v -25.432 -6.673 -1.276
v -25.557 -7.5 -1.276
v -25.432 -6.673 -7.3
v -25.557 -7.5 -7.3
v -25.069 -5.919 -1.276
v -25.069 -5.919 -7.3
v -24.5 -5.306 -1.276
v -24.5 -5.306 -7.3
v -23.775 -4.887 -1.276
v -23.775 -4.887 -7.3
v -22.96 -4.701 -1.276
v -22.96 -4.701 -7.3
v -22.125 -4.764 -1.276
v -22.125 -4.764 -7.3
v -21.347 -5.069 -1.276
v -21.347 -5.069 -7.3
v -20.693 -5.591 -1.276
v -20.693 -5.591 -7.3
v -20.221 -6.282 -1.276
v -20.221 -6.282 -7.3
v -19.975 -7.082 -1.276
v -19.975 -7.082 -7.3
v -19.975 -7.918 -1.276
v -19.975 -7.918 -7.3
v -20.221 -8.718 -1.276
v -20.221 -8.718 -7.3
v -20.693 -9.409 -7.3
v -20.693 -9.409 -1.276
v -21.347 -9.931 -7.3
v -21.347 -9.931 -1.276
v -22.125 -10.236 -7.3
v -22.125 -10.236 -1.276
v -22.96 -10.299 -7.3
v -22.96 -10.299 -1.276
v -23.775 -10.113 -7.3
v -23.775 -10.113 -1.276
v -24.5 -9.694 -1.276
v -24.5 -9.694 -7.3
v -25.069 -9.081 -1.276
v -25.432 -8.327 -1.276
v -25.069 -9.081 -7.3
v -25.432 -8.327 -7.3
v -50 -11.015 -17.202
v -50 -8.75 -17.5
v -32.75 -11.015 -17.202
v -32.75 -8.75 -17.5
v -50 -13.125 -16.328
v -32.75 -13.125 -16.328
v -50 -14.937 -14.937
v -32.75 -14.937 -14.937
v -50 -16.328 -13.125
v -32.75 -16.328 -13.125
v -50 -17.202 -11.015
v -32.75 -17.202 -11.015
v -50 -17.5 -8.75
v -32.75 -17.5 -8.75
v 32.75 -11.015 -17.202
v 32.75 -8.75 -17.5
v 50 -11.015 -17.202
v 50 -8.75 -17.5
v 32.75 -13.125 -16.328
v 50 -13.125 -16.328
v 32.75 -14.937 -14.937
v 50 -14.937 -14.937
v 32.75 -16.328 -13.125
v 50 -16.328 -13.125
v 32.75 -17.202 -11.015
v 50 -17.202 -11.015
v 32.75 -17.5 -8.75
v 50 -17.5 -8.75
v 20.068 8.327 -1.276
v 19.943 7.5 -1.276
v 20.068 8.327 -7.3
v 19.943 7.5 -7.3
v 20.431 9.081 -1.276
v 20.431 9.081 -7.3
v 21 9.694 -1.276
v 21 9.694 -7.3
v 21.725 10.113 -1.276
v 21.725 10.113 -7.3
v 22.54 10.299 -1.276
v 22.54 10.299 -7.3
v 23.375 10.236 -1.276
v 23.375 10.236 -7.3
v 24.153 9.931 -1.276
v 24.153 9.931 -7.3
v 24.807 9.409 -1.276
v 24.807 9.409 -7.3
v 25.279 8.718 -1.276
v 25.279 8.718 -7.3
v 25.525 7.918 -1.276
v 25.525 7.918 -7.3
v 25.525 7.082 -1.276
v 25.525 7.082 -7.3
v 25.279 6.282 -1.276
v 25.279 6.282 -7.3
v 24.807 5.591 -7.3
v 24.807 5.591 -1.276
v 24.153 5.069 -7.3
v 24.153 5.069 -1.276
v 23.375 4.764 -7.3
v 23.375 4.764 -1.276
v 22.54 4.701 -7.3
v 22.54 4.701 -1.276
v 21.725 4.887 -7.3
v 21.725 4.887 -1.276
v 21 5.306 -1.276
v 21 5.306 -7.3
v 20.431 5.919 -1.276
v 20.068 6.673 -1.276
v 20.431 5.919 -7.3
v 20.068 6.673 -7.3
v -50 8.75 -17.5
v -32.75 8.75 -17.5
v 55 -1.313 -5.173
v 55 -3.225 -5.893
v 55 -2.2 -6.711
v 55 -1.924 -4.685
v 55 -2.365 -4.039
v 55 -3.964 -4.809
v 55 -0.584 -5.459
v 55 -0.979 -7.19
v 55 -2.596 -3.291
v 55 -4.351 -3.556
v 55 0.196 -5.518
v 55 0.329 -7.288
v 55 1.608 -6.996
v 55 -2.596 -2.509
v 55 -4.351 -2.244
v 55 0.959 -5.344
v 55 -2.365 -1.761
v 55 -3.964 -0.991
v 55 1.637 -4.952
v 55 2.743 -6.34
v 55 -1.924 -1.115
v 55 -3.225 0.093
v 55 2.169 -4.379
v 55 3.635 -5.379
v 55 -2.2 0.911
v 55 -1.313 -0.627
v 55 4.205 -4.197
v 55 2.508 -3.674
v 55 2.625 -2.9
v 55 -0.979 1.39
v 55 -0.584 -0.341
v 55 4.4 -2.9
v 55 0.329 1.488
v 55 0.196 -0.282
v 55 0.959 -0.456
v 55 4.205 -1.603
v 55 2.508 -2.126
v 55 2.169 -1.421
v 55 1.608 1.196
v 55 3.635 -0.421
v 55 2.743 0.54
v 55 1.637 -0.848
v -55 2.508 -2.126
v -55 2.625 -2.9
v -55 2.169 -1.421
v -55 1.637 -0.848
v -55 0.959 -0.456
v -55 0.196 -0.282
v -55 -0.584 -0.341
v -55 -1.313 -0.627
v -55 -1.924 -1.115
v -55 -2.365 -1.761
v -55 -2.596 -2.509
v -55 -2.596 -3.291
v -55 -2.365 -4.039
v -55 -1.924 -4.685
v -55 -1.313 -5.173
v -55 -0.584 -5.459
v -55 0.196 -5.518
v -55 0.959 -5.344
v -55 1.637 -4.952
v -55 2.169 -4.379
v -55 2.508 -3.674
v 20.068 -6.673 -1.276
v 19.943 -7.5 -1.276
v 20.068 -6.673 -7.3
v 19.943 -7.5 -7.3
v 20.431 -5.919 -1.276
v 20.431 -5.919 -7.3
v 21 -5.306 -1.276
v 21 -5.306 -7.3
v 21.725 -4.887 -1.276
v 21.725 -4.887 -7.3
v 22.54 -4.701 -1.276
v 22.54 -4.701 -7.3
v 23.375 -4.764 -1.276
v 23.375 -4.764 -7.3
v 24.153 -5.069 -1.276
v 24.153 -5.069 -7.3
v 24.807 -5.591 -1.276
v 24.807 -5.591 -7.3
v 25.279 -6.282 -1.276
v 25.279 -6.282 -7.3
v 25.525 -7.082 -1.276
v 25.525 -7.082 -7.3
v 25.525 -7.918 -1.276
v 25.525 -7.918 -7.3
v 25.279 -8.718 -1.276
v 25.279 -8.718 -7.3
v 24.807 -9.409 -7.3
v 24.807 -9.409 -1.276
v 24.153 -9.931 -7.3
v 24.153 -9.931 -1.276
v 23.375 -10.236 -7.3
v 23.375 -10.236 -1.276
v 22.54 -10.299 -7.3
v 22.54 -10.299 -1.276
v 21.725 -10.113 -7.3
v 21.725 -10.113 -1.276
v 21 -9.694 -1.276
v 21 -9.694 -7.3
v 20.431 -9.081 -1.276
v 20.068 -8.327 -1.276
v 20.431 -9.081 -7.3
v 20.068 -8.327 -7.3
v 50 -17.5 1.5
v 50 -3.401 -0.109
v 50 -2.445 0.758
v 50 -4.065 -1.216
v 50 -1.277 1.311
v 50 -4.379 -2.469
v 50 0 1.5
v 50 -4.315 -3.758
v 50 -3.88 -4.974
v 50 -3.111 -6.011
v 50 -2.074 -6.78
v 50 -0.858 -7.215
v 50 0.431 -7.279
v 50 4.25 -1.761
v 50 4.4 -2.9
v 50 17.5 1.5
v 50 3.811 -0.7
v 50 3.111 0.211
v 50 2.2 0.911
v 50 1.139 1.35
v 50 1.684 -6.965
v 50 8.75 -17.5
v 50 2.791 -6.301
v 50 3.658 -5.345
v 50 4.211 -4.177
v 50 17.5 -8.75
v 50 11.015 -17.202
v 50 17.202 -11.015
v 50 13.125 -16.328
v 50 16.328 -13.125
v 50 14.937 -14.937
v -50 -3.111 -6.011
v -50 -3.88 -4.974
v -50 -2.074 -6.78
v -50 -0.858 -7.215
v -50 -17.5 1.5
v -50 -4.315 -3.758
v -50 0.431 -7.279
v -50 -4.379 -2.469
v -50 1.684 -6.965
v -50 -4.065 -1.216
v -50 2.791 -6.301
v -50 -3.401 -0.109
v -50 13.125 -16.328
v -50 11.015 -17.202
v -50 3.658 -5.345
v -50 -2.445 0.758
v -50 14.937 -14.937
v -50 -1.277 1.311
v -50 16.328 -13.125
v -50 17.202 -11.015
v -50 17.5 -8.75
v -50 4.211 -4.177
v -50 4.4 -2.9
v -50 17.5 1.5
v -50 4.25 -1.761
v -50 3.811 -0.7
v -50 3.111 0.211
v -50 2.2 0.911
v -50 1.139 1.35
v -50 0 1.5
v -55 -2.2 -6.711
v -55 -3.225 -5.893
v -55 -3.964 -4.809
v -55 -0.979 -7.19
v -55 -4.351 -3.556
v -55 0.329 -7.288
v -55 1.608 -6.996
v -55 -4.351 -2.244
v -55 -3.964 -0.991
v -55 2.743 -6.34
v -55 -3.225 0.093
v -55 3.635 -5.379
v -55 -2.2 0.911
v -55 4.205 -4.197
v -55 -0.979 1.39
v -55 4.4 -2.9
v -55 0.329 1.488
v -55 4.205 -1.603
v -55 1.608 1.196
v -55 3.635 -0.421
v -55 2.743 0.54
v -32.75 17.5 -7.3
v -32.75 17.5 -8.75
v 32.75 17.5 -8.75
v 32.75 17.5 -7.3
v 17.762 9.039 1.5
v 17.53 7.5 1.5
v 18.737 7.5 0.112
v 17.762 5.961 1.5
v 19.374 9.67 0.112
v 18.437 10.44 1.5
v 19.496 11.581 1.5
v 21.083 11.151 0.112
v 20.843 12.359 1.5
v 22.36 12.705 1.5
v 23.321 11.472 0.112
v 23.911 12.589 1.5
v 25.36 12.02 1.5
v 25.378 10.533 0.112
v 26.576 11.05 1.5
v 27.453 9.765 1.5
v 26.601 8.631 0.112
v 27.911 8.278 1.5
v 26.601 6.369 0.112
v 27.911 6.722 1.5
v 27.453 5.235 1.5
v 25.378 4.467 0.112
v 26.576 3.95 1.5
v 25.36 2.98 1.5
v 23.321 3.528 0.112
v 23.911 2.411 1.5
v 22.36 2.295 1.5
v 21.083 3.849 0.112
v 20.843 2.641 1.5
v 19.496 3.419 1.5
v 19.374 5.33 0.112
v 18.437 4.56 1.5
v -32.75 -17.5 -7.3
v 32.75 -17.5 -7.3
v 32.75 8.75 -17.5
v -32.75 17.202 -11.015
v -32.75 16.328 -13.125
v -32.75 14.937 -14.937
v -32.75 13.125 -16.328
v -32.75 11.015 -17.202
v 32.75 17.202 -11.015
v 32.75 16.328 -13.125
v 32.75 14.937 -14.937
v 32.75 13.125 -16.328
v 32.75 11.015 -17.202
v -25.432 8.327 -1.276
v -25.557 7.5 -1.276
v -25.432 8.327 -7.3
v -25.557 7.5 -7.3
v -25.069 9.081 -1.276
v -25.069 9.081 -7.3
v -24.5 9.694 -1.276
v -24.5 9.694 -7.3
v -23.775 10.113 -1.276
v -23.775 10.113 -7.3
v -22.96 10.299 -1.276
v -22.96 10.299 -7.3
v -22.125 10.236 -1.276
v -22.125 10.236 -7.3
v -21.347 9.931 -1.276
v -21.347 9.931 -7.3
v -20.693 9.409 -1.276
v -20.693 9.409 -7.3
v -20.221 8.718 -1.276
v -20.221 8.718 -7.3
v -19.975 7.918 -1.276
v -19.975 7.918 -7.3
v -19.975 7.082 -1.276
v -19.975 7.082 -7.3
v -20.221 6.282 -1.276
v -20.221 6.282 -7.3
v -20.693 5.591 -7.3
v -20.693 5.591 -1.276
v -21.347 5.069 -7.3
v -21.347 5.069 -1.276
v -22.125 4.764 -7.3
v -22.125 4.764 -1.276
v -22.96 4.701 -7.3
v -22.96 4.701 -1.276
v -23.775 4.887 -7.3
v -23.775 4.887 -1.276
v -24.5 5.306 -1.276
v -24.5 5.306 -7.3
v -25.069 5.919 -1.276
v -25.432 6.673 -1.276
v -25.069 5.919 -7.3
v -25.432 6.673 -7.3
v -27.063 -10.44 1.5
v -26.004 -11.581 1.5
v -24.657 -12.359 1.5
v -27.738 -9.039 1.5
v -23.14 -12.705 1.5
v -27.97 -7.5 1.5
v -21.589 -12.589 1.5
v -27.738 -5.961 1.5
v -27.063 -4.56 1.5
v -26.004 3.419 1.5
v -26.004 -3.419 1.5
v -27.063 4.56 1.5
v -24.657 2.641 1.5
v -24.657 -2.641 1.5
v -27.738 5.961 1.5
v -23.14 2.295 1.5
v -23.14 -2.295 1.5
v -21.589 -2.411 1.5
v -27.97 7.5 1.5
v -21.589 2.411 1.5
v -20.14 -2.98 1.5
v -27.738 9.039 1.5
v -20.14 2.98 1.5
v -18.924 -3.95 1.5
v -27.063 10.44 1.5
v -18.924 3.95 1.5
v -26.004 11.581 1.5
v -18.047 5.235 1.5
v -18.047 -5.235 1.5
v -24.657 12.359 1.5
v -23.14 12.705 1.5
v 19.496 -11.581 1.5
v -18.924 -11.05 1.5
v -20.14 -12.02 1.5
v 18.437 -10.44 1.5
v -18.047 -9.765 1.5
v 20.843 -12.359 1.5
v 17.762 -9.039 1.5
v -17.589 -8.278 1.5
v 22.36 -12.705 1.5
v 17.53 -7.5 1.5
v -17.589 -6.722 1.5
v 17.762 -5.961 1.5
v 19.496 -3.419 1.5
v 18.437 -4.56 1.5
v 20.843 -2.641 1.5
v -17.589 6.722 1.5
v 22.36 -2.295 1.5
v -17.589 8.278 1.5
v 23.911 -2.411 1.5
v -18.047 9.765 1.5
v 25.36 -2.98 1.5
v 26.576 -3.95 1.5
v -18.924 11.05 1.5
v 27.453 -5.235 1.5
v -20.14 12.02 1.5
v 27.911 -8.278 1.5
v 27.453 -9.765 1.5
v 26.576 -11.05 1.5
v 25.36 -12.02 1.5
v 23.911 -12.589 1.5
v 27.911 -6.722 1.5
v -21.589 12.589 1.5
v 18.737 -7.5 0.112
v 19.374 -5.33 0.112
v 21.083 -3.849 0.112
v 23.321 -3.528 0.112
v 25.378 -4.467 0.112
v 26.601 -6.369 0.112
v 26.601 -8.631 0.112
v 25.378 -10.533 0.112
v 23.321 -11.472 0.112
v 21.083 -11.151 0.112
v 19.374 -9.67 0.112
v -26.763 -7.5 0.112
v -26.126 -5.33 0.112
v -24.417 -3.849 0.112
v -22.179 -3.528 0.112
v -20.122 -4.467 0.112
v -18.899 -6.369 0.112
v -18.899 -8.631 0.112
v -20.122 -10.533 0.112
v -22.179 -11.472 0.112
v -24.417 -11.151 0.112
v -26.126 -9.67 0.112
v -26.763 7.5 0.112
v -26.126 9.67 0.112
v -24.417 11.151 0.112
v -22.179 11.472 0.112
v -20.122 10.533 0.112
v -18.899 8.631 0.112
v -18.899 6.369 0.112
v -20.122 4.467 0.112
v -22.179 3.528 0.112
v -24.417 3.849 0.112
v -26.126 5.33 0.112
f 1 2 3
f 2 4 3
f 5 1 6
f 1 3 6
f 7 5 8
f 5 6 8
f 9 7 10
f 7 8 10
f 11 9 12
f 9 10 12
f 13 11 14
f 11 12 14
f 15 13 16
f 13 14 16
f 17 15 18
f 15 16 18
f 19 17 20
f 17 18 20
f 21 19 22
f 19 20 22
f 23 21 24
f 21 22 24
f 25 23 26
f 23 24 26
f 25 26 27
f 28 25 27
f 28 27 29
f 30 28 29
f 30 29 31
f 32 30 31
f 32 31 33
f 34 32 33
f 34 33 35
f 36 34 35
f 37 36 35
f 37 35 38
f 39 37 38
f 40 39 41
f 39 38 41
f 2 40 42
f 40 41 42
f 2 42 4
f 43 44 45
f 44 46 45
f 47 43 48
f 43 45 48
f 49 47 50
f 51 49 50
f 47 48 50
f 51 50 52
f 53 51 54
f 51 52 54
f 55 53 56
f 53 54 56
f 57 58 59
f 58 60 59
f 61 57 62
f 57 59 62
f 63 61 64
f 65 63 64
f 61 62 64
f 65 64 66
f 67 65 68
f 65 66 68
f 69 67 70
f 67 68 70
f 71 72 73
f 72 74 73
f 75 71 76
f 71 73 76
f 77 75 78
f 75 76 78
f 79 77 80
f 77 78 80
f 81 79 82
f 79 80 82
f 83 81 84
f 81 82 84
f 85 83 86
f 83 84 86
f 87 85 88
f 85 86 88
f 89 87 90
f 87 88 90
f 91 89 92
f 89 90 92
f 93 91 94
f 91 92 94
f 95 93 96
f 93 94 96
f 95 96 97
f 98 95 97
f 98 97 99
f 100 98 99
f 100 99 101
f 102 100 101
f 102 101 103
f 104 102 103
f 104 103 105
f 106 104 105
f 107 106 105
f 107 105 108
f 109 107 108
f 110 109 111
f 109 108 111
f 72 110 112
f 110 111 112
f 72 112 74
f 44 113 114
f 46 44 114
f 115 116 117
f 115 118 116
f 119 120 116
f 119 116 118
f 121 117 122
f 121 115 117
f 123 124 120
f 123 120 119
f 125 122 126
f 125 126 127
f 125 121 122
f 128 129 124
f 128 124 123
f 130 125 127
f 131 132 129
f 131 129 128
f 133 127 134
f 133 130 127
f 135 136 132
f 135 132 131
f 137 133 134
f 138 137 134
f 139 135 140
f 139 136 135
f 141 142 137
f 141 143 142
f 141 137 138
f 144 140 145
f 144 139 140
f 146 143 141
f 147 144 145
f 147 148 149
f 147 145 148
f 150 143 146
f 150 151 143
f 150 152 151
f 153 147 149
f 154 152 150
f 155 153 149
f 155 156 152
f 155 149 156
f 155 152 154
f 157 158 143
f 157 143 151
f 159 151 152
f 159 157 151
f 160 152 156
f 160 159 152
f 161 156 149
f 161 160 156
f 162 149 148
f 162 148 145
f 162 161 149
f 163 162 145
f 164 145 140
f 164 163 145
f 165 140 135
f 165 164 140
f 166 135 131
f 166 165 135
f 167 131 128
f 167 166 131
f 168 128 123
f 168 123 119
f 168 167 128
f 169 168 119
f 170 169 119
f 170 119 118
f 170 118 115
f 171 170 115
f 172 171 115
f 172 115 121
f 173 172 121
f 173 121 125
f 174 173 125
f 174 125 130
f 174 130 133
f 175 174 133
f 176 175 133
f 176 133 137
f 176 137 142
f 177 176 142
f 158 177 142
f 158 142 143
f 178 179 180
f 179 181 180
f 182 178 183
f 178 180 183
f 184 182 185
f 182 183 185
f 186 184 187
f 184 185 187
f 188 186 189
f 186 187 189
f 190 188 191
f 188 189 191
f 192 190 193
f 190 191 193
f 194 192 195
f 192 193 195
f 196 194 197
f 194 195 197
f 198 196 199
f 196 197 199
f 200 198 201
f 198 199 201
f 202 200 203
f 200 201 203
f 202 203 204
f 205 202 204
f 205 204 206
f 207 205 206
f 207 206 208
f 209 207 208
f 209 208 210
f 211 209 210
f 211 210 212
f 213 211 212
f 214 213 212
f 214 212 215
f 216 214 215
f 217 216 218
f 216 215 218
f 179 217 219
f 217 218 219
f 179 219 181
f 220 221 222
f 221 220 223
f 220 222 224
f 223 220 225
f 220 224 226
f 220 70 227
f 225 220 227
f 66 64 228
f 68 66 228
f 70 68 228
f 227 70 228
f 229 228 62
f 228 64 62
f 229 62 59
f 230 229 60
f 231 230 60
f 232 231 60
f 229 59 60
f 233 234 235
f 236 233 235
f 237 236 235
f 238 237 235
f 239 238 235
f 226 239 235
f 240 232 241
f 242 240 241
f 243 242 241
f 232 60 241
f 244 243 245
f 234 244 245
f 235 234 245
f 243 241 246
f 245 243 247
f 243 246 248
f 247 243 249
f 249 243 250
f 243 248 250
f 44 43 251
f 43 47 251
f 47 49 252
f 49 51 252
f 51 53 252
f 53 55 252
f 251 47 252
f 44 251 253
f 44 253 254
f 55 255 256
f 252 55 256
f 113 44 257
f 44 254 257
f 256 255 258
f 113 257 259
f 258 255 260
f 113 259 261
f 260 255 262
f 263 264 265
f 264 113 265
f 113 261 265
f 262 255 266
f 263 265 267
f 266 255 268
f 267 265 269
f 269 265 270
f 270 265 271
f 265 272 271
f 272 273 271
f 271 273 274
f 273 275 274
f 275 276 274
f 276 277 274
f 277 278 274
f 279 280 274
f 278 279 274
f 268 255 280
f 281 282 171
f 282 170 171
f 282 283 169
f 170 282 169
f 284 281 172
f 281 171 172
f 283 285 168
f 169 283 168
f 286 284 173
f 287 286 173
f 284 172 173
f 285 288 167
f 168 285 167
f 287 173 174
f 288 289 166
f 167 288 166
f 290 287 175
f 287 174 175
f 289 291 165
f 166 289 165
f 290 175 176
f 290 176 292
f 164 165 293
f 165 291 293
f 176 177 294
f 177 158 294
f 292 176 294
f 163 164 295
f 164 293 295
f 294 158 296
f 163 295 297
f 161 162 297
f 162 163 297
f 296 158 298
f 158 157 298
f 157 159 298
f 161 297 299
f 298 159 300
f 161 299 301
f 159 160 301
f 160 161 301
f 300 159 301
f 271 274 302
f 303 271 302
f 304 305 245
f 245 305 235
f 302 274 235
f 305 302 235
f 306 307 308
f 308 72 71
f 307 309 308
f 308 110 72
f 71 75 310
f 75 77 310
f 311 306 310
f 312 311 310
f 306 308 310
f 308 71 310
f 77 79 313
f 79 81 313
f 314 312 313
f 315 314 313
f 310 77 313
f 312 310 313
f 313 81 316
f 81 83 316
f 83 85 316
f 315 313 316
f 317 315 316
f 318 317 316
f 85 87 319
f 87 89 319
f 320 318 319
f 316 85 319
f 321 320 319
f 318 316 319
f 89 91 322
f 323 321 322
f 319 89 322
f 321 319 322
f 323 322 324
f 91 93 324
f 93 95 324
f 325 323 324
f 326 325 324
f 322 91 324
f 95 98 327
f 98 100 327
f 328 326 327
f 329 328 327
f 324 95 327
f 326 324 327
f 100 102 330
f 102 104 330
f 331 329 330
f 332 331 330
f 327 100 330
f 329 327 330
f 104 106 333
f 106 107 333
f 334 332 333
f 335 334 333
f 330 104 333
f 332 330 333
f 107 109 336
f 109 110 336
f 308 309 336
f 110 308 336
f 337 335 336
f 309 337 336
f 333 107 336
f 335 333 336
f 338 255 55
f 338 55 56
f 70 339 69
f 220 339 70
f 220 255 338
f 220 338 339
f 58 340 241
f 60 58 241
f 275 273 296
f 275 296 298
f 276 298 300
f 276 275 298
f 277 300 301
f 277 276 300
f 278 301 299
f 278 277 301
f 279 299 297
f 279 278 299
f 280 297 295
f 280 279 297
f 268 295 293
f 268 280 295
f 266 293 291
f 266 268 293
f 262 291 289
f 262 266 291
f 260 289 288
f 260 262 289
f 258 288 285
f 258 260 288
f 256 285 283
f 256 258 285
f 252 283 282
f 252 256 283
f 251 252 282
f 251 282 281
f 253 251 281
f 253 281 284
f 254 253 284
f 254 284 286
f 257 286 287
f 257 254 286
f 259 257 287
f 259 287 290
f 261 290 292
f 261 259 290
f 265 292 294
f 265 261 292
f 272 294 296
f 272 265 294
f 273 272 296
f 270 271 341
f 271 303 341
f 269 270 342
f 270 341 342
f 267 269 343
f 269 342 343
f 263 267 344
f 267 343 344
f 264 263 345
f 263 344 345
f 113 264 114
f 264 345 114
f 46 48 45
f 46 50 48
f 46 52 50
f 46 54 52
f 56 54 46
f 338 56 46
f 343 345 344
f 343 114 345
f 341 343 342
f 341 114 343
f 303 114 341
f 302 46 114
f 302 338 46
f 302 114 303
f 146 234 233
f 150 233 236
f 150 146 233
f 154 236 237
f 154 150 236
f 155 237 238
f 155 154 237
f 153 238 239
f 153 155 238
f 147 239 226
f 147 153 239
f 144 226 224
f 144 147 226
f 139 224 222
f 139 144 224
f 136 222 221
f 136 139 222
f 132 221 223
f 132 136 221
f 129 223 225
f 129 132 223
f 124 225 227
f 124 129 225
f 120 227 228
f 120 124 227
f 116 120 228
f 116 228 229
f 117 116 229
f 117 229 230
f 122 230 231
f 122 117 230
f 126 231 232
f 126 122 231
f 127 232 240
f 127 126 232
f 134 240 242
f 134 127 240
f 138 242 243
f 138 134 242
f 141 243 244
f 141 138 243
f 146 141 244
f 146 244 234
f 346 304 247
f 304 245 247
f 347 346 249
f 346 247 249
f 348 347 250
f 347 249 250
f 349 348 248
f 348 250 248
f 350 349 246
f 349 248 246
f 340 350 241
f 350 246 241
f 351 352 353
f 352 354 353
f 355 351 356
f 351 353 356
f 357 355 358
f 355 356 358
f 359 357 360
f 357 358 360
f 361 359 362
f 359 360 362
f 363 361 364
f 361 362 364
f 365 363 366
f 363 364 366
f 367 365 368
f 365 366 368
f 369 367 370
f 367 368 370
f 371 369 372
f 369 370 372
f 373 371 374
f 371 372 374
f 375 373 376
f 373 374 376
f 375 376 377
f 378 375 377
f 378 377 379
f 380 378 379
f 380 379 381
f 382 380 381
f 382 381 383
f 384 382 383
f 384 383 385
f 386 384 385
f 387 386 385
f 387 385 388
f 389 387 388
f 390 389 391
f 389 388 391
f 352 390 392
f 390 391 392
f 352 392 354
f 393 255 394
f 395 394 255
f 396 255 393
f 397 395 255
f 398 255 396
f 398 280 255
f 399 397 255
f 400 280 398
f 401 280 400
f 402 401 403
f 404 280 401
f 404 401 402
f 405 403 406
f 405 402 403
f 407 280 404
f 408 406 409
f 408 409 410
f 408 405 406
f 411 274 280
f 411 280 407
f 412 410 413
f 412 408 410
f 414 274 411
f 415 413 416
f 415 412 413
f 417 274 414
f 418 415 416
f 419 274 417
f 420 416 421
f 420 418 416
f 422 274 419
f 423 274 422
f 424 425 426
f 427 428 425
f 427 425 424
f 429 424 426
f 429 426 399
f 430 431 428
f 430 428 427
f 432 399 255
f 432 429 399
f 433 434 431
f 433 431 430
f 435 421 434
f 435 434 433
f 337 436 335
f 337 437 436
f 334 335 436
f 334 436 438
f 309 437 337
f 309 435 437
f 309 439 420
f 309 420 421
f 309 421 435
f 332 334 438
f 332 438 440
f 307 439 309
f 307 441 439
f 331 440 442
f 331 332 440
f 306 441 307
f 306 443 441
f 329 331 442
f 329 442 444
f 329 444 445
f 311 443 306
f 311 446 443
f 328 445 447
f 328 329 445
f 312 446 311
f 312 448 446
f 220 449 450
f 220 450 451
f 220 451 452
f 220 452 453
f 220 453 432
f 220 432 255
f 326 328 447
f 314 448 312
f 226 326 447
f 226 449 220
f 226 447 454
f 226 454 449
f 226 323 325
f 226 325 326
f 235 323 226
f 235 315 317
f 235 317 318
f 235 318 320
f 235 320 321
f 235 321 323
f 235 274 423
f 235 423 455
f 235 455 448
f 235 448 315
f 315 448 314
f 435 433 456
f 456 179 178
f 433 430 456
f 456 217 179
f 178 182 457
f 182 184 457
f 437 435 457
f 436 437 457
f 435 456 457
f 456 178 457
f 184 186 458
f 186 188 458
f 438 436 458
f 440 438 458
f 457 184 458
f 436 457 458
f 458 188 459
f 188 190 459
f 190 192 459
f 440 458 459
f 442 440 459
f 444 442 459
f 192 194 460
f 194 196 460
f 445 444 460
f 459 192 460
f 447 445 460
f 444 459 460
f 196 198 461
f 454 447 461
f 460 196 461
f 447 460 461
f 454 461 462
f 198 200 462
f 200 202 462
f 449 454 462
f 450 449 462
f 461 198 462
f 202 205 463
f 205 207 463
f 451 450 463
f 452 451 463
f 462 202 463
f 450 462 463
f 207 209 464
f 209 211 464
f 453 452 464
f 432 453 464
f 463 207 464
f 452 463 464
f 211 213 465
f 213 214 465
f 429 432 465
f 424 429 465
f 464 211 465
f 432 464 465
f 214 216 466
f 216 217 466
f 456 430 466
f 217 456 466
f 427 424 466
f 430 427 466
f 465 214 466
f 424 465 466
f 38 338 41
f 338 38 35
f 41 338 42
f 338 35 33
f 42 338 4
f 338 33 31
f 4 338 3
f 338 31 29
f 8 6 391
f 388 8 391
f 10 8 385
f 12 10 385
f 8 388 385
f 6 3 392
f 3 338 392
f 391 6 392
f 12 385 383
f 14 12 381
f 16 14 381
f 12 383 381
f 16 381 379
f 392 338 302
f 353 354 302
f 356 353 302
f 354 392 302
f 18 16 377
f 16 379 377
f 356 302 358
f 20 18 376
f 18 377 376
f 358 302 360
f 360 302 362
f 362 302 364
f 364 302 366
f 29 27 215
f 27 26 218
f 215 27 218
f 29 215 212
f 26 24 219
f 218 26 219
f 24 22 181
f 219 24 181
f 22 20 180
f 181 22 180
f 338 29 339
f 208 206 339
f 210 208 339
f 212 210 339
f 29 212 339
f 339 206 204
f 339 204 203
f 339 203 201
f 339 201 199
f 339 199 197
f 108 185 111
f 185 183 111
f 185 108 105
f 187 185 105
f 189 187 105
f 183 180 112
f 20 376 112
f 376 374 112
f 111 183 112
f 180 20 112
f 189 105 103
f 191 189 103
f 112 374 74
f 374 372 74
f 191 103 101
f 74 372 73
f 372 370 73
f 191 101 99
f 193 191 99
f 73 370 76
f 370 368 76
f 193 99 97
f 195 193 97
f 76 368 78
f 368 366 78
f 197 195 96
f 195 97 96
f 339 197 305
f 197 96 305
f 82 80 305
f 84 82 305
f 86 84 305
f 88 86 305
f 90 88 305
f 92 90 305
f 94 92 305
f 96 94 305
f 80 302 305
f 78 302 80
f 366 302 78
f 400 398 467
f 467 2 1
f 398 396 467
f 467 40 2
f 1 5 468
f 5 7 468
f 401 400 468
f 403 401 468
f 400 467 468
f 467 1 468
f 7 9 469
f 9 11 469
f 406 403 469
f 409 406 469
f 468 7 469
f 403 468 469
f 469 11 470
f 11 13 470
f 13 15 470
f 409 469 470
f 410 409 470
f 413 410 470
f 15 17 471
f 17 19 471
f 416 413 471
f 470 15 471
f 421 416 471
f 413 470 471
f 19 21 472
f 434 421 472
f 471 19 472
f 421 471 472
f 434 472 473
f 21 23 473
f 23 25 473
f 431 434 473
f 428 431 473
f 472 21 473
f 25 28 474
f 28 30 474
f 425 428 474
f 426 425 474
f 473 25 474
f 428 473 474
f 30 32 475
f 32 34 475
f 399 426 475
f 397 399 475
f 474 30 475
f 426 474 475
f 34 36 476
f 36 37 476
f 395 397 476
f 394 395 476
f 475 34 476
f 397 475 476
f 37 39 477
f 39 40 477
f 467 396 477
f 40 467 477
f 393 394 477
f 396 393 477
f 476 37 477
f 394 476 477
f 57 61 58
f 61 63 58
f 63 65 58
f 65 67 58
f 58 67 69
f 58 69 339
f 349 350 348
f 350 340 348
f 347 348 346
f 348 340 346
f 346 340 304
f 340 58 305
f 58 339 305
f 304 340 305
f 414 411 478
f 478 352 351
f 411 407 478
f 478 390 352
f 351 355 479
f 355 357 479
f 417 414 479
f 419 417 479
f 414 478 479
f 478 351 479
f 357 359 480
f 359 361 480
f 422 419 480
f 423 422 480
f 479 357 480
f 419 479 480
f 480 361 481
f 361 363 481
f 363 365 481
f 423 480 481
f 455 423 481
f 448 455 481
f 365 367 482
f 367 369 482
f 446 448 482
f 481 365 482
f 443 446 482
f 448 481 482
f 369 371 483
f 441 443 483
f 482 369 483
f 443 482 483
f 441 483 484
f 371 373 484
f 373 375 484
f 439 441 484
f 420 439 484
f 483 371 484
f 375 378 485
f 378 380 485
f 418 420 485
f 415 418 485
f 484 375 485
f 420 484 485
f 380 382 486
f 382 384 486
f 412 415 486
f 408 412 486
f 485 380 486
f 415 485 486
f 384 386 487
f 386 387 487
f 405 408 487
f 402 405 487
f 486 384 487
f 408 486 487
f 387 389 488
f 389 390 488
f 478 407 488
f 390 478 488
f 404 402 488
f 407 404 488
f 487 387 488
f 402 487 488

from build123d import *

# Parameters (mm, degrees)
F0_W           = 65.5
F0_H           = 35
F0_W_2         = 17.25
F1_DEPTH       = 1.5
F2_DEPTH       = 17.5
F3_DEPTH       = 7.3
F4_R           = 4.4
F4_R_2         = 2.625
F5_DEPTH       = 55
F6_DEPTH       = 55.001
F6_DEPTH_BACK  = 55.001
F7_R           = 8.75
F9_D           = 5.6134
F9_CSINK_D     = 10.4394
F9_CSINK_ANGLE = 82


with BuildPart() as f1:
    # F0 (on Top) → F1 (new body)
    with BuildSketch(Plane.XY):
        Rectangle(F0_W, F0_H)
        with Locations((-41.375, 0)):
            Rectangle(F0_W_2, F0_H)
        with Locations((41.375, 0)):
            Rectangle(F0_W_2, F0_H)
    extrude(amount=F1_DEPTH)

    # F0 (on Top) → F2 (join)
    with BuildSketch(Plane.XY):
        with Locations((-41.375, 0)):
            Rectangle(F0_W_2, F0_H)
        with Locations((41.375, 0)):
            Rectangle(F0_W_2, F0_H)
    extrude(amount=-F2_DEPTH)

    # F0 (on Top) → F3 (join)
    with BuildSketch(Plane.XY):
        Rectangle(F0_W, F0_H)
    extrude(amount=-F3_DEPTH)

    # F4 (on Right) → F5 (join, symmetric)
    with BuildSketch(Plane.YZ):
        with Locations((0, -2.9)):
            Circle(F4_R)
        with Locations((0, -2.9)):
            Circle(F4_R_2, mode=Mode.SUBTRACT)
    extrude(amount=F5_DEPTH, both=True)

    # F4 (on Right) → F6 (cut, two sides)
    with BuildSketch(Plane.YZ) as f6_sk:
        with Locations((0, -2.9)):
            Circle(F4_R_2)
    extrude(amount=-F6_DEPTH, mode=Mode.SUBTRACT)
    extrude(f6_sk.sketch, amount=F6_DEPTH_BACK, mode=Mode.SUBTRACT)

    # F7
    f7_edges = [f1.edges().sort_by_distance(p)[0] for p in [
        (41.375, -17.5, -17.5),
        (41.375, 17.5, -17.5),
        (-41.375, -17.5, -17.5),
        (-41.375, 17.5, -17.5),
    ]]
    fillet(f7_edges, radius=F7_R)

    # F9 (through all)
    with Locations(Plane.XY.offset(1.5)):
        with Locations((-22.75, 7.5), (-22.75, -7.5), (22.75, -7.5), (22.75, 7.5)):
            CounterSinkHole(F9_D / 2, F9_CSINK_D / 2, counter_sink_angle=F9_CSINK_ANGLE)


solid = f1.part
